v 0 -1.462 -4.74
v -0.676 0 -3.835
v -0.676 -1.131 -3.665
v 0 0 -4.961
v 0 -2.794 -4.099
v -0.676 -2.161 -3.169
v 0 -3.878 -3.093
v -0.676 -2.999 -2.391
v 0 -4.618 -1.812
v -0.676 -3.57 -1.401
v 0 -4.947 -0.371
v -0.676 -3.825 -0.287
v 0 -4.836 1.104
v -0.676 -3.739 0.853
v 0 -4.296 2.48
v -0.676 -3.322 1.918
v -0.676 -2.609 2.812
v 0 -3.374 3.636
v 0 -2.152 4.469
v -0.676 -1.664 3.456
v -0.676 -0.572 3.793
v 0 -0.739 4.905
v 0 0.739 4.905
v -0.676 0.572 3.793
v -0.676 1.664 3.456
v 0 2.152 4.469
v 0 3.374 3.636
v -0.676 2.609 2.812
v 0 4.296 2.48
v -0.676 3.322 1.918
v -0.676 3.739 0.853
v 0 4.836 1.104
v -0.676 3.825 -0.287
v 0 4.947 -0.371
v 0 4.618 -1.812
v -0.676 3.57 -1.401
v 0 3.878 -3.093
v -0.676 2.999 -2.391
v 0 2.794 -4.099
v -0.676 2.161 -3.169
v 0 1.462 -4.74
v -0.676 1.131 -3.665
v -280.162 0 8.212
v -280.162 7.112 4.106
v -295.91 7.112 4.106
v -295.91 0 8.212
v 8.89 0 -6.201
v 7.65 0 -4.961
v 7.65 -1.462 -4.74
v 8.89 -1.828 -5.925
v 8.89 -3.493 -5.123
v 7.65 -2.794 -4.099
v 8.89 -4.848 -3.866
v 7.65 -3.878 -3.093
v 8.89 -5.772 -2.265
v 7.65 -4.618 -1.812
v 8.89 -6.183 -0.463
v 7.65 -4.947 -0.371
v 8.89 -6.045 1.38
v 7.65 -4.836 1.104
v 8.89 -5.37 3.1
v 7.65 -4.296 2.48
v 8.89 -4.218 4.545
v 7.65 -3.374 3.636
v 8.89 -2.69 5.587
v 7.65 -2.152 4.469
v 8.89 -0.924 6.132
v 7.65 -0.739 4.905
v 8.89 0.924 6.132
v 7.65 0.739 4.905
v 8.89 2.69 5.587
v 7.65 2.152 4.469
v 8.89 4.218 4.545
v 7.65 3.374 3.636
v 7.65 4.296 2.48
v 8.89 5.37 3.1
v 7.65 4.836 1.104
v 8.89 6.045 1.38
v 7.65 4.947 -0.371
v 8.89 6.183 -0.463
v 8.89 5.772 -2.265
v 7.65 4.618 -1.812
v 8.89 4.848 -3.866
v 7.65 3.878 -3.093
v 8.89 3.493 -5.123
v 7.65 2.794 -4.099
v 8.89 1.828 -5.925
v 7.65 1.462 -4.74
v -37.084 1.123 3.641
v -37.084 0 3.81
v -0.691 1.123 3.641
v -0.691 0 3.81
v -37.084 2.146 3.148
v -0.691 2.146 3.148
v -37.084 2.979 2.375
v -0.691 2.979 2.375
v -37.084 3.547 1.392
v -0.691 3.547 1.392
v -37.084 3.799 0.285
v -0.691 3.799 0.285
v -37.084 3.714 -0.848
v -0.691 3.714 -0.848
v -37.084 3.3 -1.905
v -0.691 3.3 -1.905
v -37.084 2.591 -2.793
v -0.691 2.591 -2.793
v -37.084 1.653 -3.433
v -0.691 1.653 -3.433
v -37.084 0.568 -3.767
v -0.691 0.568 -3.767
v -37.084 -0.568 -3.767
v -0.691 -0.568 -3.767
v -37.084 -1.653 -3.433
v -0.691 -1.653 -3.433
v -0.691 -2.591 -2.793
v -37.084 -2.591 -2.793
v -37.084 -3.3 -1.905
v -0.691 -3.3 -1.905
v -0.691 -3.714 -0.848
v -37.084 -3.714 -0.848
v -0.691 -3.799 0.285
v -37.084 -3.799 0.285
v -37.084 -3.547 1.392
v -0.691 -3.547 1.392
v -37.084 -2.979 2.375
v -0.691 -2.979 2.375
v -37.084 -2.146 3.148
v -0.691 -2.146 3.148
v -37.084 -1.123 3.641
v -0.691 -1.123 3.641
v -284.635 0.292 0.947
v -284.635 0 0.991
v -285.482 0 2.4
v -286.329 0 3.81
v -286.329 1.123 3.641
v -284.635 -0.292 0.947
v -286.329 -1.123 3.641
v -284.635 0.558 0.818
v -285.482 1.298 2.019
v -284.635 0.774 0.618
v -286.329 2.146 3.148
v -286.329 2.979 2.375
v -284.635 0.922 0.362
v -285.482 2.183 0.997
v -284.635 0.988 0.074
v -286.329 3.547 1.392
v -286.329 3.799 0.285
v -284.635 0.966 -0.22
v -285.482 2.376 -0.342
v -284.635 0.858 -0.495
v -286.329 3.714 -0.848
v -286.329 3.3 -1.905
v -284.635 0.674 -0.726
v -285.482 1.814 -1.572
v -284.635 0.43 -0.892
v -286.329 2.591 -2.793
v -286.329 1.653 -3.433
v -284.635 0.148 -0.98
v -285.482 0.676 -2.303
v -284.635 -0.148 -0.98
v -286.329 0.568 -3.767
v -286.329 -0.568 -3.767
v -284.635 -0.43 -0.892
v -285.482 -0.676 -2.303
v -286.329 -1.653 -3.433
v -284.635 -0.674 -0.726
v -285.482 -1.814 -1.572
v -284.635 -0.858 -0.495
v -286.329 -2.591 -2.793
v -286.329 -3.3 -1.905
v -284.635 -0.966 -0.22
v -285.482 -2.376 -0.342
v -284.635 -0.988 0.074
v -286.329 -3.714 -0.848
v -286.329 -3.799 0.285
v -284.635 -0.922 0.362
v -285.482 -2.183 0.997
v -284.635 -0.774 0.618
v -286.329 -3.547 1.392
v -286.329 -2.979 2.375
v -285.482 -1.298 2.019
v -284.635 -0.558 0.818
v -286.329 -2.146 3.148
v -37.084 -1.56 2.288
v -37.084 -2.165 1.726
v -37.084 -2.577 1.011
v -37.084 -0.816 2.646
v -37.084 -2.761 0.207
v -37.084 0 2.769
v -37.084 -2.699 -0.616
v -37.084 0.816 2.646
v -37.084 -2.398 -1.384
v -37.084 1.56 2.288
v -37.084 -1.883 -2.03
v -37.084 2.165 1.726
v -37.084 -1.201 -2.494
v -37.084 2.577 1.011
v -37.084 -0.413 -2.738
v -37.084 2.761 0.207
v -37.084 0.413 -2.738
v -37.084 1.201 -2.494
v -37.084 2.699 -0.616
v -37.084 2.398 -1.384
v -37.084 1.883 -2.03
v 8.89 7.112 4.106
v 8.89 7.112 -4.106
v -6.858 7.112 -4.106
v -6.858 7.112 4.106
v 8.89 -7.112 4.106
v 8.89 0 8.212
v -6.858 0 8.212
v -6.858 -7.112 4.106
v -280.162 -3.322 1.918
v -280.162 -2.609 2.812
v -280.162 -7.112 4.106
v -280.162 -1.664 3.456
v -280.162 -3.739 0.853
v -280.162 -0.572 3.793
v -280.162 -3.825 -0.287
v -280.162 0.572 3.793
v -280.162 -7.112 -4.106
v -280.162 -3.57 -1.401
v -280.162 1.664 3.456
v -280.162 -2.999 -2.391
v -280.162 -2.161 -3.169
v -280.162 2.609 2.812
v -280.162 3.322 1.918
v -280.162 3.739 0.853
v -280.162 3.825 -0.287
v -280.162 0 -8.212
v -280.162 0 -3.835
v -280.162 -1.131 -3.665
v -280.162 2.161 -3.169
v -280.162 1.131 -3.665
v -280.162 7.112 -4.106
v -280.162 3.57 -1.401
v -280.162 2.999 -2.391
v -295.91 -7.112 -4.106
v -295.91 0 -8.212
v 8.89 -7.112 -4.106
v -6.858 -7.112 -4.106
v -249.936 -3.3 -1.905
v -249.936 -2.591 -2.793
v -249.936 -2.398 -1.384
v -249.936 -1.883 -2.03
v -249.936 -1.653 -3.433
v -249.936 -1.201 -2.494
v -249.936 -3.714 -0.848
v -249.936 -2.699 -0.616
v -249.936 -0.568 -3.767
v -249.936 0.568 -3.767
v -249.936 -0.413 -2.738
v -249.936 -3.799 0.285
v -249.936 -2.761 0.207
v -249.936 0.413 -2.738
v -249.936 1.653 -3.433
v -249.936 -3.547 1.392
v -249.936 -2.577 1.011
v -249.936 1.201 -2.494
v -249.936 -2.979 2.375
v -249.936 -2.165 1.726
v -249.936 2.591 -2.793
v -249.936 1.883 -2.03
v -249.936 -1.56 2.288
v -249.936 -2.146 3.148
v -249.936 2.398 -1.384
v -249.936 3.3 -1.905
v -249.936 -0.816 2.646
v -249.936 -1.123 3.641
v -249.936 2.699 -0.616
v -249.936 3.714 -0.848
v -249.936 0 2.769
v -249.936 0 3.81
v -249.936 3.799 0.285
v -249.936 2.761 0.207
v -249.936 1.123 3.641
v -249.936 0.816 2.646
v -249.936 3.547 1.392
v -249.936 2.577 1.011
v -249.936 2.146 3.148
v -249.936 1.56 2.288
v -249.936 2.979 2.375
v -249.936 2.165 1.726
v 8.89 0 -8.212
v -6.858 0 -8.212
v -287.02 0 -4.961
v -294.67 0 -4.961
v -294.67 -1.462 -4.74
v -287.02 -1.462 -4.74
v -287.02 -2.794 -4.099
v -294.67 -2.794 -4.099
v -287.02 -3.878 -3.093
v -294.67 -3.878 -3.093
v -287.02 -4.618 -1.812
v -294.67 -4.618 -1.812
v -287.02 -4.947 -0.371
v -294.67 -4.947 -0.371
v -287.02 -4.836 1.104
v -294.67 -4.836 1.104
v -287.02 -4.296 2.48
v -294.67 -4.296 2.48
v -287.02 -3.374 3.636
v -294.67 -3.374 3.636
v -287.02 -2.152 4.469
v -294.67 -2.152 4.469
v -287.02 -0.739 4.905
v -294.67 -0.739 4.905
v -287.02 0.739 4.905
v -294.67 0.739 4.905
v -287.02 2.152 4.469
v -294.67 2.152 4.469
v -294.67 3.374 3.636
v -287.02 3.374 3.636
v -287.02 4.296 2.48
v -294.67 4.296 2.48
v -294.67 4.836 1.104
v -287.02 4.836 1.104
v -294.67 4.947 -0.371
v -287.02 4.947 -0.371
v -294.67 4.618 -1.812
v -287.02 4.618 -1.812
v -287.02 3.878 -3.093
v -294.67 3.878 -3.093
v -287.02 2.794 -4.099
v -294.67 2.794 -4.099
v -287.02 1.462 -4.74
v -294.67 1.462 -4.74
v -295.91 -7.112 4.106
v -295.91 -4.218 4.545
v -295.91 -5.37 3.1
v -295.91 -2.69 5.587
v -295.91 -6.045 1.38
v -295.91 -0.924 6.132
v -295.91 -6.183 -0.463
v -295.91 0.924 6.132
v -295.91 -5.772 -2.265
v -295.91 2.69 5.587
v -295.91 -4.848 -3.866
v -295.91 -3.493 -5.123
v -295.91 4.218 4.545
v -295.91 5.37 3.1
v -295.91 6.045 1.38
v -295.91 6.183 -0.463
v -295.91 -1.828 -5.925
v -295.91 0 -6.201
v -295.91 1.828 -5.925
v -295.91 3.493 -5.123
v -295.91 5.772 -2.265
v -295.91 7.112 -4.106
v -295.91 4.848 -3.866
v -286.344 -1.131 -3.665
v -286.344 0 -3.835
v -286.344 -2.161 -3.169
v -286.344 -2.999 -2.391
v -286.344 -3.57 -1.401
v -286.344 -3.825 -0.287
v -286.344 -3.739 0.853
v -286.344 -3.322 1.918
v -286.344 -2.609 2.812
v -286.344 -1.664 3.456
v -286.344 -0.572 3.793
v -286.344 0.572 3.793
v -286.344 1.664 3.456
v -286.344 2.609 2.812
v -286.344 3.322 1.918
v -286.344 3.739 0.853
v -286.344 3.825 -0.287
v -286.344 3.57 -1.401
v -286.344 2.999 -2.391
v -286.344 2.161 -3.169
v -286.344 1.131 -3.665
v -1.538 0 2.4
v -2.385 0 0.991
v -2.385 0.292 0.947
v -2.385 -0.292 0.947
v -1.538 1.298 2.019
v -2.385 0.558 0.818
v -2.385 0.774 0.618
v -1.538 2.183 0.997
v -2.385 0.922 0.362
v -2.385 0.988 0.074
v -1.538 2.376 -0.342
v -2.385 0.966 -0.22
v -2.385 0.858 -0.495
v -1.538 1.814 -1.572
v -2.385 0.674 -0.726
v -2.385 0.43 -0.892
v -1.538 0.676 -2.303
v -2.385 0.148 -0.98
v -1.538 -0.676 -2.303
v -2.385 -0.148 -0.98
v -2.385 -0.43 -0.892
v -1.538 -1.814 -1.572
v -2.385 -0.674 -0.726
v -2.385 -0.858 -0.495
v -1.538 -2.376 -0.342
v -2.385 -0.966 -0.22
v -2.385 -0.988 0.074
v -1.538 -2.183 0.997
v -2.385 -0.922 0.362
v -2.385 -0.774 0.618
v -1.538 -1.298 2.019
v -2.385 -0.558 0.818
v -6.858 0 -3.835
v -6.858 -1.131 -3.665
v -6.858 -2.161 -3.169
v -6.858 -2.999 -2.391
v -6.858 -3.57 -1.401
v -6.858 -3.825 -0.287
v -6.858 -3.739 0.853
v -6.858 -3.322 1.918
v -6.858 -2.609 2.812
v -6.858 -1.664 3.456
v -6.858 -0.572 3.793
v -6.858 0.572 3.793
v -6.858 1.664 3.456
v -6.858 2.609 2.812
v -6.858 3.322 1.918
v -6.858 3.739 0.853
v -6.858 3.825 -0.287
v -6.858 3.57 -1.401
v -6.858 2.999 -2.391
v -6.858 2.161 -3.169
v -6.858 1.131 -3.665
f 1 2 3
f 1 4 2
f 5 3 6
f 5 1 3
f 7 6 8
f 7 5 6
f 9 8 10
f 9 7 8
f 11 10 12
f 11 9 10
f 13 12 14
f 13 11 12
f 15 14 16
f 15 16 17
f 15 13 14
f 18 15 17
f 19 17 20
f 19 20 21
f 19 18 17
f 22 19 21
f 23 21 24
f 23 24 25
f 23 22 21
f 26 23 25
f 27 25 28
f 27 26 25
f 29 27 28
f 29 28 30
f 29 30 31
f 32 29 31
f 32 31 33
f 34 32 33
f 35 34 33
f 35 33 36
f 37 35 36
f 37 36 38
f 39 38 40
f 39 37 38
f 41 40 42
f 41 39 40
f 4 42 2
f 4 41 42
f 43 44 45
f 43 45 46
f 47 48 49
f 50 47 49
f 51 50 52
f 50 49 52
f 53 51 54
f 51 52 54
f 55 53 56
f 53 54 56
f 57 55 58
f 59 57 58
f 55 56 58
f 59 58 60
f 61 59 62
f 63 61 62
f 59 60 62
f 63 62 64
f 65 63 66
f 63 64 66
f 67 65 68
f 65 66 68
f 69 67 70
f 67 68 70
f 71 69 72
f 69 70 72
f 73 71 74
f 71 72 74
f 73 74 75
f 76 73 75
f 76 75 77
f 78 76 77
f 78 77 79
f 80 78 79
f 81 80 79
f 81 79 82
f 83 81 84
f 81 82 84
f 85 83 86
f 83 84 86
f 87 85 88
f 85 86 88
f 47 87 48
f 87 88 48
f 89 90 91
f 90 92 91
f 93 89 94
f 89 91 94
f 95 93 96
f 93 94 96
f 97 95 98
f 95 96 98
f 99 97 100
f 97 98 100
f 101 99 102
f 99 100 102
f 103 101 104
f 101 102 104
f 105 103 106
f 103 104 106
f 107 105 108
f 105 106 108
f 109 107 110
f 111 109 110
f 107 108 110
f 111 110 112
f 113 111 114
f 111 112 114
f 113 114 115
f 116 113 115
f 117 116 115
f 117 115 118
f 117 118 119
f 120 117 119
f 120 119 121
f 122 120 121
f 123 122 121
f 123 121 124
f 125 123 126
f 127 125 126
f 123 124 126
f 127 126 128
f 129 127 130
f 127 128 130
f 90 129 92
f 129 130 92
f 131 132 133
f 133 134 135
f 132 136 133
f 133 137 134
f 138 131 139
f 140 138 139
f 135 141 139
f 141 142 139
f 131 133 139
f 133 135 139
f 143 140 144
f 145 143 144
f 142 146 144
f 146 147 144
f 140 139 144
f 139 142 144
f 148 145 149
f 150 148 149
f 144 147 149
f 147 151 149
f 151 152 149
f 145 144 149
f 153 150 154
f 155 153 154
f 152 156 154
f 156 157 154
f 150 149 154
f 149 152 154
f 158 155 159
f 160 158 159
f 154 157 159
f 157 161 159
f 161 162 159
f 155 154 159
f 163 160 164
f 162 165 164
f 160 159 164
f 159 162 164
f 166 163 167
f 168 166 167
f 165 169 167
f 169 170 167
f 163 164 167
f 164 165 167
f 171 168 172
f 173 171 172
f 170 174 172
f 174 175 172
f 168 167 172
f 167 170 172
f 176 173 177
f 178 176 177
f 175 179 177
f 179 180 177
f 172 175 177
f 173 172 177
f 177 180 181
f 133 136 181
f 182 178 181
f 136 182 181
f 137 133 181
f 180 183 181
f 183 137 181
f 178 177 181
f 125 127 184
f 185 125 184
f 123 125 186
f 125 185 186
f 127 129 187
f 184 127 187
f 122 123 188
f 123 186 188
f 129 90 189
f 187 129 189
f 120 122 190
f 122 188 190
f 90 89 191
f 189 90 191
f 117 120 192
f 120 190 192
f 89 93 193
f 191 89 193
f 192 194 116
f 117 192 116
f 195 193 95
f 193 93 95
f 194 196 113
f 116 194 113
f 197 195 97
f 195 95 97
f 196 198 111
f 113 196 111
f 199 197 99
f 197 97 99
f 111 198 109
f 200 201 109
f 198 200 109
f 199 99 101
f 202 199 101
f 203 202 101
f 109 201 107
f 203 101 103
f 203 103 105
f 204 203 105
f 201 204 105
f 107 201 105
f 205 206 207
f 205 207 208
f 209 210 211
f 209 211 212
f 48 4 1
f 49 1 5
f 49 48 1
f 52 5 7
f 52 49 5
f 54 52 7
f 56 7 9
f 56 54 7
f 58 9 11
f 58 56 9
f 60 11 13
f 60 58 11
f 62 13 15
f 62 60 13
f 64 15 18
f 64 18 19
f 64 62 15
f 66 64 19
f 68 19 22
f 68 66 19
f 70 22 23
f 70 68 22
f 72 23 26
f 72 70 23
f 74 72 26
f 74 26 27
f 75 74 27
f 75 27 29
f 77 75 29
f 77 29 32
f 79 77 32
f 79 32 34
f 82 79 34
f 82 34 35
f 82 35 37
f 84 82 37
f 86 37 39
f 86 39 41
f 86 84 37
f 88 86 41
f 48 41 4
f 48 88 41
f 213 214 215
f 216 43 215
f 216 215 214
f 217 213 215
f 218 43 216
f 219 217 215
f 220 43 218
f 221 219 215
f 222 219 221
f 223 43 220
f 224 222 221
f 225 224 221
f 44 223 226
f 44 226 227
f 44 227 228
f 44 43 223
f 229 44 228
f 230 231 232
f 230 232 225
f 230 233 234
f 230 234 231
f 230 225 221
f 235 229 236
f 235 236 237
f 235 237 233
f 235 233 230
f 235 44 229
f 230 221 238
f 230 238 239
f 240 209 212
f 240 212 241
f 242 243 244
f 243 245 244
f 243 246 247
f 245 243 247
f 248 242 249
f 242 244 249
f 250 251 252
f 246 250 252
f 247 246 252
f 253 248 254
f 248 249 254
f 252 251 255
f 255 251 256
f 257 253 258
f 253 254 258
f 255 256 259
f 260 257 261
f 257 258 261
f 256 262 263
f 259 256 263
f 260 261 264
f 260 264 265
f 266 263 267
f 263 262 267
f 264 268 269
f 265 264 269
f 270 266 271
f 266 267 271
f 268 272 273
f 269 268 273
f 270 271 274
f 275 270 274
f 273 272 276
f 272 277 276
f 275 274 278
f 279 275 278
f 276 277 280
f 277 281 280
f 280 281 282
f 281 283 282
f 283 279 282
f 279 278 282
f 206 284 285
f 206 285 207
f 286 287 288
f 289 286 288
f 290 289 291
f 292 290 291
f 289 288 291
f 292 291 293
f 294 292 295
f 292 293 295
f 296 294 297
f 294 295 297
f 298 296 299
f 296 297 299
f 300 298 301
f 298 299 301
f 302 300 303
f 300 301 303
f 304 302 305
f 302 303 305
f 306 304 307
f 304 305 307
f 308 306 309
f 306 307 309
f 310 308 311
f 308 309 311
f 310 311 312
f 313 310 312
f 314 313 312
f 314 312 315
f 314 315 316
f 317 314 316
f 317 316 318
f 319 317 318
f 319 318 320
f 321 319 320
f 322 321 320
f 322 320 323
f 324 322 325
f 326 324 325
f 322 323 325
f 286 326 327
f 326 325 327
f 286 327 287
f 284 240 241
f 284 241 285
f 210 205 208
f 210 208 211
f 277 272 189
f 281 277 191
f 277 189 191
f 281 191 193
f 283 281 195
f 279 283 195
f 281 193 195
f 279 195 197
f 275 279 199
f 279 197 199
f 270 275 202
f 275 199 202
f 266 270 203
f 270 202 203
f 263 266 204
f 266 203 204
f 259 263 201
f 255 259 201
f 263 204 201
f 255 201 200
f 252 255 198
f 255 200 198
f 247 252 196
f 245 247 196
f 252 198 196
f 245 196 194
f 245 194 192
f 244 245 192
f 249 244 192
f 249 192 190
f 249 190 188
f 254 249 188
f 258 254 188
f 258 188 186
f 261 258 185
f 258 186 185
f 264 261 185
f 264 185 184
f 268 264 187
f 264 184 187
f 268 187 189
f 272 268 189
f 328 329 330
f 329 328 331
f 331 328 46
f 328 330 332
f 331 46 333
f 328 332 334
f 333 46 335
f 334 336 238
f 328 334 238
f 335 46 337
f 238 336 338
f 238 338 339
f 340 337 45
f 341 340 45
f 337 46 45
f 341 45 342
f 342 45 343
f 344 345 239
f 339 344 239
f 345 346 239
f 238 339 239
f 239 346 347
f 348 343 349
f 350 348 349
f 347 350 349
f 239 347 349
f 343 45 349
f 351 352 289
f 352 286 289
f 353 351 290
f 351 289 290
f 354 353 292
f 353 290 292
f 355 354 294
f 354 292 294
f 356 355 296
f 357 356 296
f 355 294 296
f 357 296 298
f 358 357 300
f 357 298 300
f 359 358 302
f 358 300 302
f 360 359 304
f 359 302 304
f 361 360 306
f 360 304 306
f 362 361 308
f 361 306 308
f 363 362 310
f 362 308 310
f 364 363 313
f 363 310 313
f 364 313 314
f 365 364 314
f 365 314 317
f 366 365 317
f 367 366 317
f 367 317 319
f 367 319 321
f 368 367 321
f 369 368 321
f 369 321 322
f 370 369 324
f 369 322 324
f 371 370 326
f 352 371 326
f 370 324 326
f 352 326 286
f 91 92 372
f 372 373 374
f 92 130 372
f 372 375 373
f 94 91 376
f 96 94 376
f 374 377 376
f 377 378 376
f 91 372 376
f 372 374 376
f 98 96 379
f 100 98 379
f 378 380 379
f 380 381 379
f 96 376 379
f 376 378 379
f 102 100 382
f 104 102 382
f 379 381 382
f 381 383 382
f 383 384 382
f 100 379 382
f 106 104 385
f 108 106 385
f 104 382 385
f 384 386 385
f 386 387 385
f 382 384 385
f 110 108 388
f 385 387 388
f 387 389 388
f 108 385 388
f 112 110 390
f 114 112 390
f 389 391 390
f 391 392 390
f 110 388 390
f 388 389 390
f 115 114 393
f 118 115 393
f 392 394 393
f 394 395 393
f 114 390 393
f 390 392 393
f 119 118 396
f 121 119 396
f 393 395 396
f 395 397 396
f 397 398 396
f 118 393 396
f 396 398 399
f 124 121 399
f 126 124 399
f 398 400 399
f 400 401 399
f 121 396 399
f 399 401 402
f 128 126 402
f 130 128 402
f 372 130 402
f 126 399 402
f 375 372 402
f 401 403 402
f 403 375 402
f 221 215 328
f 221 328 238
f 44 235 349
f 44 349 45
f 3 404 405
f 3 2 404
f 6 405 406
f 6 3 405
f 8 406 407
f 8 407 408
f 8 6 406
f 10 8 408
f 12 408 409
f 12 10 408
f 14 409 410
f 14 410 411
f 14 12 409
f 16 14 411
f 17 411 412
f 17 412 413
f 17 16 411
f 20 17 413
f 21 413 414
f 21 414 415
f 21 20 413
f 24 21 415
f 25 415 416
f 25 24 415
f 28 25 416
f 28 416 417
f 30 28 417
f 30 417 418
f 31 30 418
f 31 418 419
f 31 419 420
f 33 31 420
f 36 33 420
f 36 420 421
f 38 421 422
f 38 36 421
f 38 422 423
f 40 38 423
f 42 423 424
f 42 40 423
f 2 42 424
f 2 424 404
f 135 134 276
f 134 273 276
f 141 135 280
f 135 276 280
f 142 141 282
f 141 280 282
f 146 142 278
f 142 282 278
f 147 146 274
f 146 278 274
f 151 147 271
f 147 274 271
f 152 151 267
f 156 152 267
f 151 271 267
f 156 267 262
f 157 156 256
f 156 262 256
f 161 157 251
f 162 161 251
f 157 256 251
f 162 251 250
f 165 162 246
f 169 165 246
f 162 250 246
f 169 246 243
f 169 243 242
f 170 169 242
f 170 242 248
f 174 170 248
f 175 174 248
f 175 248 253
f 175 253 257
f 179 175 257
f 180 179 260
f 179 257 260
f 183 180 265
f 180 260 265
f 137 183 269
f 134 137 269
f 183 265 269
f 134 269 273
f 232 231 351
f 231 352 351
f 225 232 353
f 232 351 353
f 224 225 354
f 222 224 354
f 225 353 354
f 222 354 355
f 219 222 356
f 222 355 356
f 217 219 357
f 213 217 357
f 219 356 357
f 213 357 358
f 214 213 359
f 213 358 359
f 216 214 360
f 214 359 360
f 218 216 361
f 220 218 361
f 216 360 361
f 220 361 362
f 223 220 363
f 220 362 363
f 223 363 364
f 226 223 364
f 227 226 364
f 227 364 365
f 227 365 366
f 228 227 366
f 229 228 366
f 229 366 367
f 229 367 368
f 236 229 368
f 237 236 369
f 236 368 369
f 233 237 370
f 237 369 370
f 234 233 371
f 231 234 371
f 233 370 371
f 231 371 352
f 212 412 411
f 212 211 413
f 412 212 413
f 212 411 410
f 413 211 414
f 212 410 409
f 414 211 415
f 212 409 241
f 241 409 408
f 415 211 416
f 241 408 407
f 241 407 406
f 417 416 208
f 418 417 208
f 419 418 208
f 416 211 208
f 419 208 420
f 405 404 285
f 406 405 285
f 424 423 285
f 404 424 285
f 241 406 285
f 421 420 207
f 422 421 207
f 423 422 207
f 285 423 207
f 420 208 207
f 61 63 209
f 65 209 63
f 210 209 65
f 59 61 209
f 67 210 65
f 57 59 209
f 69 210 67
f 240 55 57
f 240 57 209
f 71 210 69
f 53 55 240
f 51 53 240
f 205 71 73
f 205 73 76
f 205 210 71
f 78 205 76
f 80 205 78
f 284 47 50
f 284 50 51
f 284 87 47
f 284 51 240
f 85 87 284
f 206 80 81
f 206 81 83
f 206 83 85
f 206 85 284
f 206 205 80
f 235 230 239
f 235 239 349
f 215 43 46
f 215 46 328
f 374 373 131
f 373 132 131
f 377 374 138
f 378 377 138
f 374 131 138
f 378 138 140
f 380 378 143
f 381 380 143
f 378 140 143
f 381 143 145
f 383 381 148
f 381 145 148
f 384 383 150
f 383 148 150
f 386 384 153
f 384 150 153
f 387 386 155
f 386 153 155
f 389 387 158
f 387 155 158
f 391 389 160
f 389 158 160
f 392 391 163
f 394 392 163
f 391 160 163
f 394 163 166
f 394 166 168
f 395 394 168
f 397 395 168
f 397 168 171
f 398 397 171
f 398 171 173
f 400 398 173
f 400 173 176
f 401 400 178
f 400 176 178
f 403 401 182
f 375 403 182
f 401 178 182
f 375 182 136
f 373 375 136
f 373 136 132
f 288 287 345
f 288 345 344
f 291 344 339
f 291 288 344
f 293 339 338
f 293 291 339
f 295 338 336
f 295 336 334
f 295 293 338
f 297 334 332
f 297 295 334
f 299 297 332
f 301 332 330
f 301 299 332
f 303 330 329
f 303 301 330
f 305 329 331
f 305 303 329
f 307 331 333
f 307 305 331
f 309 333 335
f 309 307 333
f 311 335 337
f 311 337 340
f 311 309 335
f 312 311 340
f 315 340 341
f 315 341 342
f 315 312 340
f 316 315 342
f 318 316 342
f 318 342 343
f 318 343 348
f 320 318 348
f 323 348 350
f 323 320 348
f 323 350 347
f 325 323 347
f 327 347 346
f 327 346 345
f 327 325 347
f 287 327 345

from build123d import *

# Parameters (mm, degrees)
EXTRUDE2_DEPTH = 15.748
CHAMFER2_SIZE  = 1.240155


with BuildPart() as part:
    # Sketch5 → Extrude2 (new body)
    with BuildSketch(Plane(origin=(-6.858, 0, 0), x_dir=(0, 0, -1), z_dir=(1, 0, 0))):
        Polygon((4.106115114, 7.112), (-4.106115114, 7.112), (-8.212230229, 0), (-4.106115114, -7.112), (4.106115114, -7.112), (8.212230229, 0), align=None)
    extrude(amount=EXTRUDE2_DEPTH)

    # Sketch6 → Hole2 (revolve, cut)
    with BuildSketch(Plane(origin=(8.89, 0, 0), x_dir=(0, 0, -1), z_dir=(0, 1, 0))):
        Polygon((0, 0), (0, 15.748), (3.8354, 15.748), (3.8354, 9.566100386), (4.96062, 8.89), (4.96062, 0), align=None)
    revolve(axis=Axis((15.020023899, 0, 0), (-1, 0, 0)), mode=Mode.SUBTRACT)

    # Chamfer2
    chamfer2_edges = [part.edges().sort_by_distance(p)[0] for p in [
        (8.89, 0, 4.96062),
    ]]
    chamfer(chamfer2_edges, length=CHAMFER2_SIZE)


with BuildPart() as body_2:
    # Sketch8 → Revolve2 (revolve)
    with BuildSketch(Plane(origin=(0, 0, 0), x_dir=(-1, 0, 0), z_dir=(0, 0, -1)), mode=Mode.PRIVATE) as revolve2_sk:
        Polygon((0.691362245, 3.81), (2.385428675, 0.9906), (284.634571325, 0.9906), (286.328637755, 3.81), (249.936, 3.81), (249.936, 2.7686), (37.084, 2.7686), (37.084, 3.81), align=None)
    revolve(revolve2_sk.sketch.rotate(Axis((-0.691362245, 0, 0), (-1, 0, 0)), 270), axis=Axis((-0.691362245, 0, 0), (-1, 0, 0)))  # turned: the seam where the file's is


with BuildPart() as body_3:
    # Mirror2: mirrored copy
    add(part.part.mirror(Plane(origin=(-143.51, 0, 0), x_dir=(0, 0, 1), z_dir=(1, 0, 0))))


solid = Compound([part.part, body_2.part, body_3.part])
